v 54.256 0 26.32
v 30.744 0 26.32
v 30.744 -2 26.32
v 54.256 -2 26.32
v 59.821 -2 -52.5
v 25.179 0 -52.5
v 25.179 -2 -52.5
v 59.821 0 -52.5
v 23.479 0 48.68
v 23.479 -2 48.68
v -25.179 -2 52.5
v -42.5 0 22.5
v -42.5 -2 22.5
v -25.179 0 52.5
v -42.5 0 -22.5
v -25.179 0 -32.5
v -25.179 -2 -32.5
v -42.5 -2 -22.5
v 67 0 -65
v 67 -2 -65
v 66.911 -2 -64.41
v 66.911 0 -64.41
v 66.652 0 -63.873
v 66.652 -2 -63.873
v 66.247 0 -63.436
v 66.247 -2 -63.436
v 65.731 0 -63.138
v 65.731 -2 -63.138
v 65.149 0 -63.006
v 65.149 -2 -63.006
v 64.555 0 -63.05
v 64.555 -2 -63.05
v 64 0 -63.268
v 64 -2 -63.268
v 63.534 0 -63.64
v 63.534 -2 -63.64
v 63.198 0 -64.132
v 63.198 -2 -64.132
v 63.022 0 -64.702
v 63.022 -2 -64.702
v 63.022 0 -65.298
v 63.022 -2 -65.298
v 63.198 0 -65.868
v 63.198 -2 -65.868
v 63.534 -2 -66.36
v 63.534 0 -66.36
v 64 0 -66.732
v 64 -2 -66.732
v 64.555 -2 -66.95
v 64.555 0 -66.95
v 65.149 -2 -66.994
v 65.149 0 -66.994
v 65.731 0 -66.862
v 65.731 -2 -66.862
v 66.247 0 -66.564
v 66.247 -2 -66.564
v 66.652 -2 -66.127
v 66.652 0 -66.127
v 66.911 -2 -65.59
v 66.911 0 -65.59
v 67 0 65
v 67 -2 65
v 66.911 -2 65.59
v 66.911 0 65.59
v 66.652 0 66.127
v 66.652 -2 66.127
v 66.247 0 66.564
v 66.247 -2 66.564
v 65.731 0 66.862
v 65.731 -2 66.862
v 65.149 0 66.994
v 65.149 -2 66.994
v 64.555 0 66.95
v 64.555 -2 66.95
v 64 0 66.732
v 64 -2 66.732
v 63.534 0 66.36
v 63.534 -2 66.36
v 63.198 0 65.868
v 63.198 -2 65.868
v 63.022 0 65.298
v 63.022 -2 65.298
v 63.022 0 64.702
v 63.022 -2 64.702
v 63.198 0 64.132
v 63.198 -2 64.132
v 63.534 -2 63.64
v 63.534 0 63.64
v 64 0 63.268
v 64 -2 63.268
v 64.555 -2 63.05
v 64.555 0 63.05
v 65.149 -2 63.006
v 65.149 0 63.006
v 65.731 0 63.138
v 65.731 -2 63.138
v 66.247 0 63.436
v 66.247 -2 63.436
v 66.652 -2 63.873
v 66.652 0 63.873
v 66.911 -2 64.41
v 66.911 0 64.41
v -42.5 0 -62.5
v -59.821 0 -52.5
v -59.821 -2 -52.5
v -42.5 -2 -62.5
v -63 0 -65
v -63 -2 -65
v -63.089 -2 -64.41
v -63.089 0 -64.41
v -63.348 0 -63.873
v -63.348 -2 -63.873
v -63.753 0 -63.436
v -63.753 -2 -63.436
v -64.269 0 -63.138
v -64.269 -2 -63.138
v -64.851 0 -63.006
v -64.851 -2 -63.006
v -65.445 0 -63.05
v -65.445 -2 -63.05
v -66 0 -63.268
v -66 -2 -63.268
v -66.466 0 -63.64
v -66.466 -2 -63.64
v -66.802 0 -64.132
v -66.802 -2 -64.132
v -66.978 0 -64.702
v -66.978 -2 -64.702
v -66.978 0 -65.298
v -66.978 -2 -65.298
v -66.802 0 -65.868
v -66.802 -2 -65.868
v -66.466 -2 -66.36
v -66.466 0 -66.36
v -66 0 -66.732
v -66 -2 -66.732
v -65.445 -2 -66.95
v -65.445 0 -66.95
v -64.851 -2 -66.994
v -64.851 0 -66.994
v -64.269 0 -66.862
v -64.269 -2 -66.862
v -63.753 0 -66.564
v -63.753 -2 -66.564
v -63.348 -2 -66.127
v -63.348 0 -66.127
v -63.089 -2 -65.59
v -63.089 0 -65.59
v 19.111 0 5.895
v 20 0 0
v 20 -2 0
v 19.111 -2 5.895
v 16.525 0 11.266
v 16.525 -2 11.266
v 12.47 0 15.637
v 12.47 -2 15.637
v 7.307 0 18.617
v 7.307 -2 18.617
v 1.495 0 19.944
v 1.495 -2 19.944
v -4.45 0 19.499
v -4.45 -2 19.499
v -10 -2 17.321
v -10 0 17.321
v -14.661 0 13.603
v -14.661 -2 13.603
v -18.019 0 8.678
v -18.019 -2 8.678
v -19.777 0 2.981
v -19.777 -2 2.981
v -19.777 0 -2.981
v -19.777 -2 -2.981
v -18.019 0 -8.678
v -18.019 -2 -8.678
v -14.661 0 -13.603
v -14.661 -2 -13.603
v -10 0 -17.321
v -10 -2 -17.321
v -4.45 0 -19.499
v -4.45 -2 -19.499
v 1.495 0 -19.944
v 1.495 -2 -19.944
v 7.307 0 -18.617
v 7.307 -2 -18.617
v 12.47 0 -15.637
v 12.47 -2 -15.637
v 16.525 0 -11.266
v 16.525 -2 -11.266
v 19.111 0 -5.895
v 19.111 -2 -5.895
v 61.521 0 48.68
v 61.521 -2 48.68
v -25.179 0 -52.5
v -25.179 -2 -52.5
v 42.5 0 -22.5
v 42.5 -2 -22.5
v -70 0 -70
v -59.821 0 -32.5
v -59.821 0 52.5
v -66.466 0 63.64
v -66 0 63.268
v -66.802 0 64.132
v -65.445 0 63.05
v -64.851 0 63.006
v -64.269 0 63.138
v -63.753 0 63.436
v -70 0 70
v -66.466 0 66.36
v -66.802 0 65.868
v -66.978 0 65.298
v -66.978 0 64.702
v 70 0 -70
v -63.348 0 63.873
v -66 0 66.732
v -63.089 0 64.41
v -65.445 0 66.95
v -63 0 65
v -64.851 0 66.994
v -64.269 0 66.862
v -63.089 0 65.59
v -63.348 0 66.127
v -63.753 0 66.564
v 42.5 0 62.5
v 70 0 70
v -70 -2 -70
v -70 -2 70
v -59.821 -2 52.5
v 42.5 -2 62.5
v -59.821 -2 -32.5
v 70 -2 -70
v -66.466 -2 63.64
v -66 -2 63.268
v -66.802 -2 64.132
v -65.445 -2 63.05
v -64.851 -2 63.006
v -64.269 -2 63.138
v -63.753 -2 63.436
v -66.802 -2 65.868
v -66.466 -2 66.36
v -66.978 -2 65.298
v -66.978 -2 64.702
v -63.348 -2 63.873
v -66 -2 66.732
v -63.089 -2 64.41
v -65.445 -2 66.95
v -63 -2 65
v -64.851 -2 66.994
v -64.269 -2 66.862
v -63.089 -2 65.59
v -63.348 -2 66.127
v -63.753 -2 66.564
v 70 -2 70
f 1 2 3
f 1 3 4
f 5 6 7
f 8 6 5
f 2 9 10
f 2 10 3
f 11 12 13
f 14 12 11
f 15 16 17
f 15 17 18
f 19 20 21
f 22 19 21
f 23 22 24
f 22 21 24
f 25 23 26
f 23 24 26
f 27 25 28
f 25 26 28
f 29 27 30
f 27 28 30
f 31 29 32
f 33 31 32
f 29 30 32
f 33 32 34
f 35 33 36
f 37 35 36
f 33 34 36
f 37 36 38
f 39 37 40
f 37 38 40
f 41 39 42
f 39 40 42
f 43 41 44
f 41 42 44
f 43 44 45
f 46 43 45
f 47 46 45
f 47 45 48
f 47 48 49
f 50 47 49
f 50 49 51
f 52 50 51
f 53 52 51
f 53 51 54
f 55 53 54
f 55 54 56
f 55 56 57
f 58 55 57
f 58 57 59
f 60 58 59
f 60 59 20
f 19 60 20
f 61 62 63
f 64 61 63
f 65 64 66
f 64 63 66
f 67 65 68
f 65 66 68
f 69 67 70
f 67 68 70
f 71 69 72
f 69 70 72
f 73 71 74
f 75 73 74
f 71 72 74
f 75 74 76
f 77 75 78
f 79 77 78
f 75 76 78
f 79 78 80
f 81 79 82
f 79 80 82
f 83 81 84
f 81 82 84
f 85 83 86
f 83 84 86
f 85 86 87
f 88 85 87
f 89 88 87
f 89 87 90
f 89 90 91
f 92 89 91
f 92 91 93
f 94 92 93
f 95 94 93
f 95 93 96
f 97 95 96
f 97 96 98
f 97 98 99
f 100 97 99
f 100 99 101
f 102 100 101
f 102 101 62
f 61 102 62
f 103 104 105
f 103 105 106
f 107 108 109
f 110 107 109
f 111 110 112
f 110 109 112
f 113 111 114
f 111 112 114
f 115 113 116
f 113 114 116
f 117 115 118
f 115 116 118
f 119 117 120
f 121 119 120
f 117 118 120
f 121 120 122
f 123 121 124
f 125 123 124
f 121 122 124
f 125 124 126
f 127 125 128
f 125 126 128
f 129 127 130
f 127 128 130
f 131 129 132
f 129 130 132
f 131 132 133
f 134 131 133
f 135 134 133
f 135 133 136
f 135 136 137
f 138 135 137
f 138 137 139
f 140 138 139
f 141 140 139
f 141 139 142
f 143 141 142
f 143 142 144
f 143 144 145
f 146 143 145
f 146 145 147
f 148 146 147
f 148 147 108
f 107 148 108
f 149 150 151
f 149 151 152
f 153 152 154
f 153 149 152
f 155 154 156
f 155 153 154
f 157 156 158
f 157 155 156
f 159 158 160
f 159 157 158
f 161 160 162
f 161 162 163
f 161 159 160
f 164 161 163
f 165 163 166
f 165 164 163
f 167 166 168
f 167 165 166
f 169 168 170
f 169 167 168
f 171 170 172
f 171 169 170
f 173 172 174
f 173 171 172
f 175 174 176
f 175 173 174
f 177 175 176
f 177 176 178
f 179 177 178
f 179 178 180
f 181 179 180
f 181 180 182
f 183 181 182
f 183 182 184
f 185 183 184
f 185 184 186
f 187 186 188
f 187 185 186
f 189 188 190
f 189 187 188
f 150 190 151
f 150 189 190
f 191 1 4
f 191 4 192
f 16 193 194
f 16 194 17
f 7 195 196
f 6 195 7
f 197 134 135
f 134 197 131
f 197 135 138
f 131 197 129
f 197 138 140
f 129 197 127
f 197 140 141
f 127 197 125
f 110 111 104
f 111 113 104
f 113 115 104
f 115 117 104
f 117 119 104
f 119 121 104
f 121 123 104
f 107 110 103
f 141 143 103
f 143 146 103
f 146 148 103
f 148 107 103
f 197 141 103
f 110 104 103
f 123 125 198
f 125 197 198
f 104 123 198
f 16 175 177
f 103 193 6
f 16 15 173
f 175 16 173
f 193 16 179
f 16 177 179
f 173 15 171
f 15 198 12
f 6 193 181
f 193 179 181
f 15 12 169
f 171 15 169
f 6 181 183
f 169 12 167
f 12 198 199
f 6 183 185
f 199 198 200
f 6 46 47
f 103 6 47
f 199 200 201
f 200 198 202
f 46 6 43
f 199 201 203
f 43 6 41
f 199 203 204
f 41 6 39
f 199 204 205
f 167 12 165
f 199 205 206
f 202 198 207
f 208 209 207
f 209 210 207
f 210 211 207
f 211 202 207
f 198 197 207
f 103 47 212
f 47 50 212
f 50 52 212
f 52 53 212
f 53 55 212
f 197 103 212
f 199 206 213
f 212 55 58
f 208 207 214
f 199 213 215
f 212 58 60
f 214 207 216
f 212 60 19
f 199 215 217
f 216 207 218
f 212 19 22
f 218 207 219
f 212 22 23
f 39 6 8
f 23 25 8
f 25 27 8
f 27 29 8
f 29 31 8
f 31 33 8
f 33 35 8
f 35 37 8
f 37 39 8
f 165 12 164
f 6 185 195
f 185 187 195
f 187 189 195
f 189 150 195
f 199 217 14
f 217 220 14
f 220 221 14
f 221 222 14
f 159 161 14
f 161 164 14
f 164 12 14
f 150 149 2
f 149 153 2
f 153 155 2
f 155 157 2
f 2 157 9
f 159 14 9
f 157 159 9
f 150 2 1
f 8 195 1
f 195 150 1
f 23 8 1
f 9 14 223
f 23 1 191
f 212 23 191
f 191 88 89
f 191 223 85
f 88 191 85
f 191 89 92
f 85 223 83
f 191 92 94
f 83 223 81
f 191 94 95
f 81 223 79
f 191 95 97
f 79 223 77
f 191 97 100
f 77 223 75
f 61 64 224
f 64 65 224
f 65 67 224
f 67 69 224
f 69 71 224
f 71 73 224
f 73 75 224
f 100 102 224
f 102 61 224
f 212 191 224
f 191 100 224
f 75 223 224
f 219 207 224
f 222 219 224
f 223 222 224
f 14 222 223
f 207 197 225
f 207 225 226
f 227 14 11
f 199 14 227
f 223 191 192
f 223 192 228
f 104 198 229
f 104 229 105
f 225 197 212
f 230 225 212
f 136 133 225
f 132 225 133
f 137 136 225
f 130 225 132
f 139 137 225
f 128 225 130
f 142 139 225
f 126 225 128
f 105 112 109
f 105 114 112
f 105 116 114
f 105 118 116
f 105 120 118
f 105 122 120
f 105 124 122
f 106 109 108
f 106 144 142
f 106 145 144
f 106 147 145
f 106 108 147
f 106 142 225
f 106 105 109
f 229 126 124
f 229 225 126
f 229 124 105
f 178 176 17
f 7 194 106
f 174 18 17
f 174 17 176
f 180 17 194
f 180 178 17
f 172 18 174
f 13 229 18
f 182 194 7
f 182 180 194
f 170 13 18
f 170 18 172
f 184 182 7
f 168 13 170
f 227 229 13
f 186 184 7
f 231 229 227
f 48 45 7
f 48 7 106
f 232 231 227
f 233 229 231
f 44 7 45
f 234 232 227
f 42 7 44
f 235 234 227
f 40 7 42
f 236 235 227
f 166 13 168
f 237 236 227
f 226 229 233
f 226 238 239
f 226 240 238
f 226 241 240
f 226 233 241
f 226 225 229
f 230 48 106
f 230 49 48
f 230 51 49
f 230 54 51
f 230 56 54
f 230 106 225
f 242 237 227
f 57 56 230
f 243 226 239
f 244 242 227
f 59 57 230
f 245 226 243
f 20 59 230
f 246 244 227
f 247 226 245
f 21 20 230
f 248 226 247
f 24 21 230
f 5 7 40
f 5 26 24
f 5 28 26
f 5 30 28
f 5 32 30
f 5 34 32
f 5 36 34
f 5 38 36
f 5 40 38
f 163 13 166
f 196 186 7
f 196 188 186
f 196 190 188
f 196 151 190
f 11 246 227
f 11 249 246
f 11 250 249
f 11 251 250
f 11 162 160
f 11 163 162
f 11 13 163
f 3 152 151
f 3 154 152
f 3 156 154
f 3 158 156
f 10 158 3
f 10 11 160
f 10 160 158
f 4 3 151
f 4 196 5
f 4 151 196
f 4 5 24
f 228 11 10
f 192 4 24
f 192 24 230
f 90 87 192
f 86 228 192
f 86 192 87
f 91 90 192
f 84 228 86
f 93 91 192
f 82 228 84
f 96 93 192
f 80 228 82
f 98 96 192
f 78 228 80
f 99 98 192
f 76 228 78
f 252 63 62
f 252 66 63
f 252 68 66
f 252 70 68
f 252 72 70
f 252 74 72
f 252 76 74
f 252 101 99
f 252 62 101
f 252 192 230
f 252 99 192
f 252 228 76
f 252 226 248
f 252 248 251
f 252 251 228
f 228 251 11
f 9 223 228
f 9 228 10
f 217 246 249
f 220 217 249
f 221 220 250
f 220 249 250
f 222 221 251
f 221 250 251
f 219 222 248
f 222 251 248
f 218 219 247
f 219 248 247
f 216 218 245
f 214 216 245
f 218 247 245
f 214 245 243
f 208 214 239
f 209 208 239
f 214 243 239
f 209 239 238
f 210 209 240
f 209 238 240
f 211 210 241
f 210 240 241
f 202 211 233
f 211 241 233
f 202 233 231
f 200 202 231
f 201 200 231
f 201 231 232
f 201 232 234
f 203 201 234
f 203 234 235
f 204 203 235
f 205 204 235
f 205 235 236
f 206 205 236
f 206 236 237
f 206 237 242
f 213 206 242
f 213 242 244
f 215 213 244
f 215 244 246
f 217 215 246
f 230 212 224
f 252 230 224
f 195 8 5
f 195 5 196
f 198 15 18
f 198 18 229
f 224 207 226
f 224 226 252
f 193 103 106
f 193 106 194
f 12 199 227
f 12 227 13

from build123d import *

# Parameters (mm, degrees)
SKETCH_W     = 140
SKETCH_H     = 140
SKETCH_R     = 20
PAD_DEPTH    = 2
SKETCH001_R  = 2
POCKET_DEPTH = 2.001


with BuildPart() as part:
    # Sketch → Pad (new body)
    with BuildSketch(Plane.XZ):
        Rectangle(SKETCH_W, SKETCH_H)
        Circle(SKETCH_R, mode=Mode.SUBTRACT)
        Polygon((-42.5, 22.5), (-25.179492, 52.5), (-59.820508, 52.5), align=None, mode=Mode.SUBTRACT)
        Polygon((42.5, -22.5), (25.179492, -52.5), (59.820508, -52.5), align=None, mode=Mode.SUBTRACT)
        Polygon((54.255705, 26.31966), (61.52113, 48.68034), (42.5, 62.5), (23.47887, 48.68034), (30.744295, 26.31966), align=None, mode=Mode.SUBTRACT)
        Polygon((-42.5, -22.5), (-59.820508, -32.5), (-59.820508, -52.5), (-42.5, -62.5), (-25.179492, -52.5), (-25.179492, -32.5), align=None, mode=Mode.SUBTRACT)
    extrude(amount=PAD_DEPTH)

    # Sketch001 (on Face24 of Pad) → Pocket (cut, through all)
    with BuildSketch(Plane.XZ.offset(2)):
        with Locations((-65, 65)):
            Circle(SKETCH001_R)
        with Locations((65, 65)):
            Circle(SKETCH001_R)
        with Locations((65, -65)):
            Circle(SKETCH001_R)
        with Locations((-65, -65)):
            Circle(SKETCH001_R)
    extrude(amount=-POCKET_DEPTH, mode=Mode.SUBTRACT)


solid = part.part
